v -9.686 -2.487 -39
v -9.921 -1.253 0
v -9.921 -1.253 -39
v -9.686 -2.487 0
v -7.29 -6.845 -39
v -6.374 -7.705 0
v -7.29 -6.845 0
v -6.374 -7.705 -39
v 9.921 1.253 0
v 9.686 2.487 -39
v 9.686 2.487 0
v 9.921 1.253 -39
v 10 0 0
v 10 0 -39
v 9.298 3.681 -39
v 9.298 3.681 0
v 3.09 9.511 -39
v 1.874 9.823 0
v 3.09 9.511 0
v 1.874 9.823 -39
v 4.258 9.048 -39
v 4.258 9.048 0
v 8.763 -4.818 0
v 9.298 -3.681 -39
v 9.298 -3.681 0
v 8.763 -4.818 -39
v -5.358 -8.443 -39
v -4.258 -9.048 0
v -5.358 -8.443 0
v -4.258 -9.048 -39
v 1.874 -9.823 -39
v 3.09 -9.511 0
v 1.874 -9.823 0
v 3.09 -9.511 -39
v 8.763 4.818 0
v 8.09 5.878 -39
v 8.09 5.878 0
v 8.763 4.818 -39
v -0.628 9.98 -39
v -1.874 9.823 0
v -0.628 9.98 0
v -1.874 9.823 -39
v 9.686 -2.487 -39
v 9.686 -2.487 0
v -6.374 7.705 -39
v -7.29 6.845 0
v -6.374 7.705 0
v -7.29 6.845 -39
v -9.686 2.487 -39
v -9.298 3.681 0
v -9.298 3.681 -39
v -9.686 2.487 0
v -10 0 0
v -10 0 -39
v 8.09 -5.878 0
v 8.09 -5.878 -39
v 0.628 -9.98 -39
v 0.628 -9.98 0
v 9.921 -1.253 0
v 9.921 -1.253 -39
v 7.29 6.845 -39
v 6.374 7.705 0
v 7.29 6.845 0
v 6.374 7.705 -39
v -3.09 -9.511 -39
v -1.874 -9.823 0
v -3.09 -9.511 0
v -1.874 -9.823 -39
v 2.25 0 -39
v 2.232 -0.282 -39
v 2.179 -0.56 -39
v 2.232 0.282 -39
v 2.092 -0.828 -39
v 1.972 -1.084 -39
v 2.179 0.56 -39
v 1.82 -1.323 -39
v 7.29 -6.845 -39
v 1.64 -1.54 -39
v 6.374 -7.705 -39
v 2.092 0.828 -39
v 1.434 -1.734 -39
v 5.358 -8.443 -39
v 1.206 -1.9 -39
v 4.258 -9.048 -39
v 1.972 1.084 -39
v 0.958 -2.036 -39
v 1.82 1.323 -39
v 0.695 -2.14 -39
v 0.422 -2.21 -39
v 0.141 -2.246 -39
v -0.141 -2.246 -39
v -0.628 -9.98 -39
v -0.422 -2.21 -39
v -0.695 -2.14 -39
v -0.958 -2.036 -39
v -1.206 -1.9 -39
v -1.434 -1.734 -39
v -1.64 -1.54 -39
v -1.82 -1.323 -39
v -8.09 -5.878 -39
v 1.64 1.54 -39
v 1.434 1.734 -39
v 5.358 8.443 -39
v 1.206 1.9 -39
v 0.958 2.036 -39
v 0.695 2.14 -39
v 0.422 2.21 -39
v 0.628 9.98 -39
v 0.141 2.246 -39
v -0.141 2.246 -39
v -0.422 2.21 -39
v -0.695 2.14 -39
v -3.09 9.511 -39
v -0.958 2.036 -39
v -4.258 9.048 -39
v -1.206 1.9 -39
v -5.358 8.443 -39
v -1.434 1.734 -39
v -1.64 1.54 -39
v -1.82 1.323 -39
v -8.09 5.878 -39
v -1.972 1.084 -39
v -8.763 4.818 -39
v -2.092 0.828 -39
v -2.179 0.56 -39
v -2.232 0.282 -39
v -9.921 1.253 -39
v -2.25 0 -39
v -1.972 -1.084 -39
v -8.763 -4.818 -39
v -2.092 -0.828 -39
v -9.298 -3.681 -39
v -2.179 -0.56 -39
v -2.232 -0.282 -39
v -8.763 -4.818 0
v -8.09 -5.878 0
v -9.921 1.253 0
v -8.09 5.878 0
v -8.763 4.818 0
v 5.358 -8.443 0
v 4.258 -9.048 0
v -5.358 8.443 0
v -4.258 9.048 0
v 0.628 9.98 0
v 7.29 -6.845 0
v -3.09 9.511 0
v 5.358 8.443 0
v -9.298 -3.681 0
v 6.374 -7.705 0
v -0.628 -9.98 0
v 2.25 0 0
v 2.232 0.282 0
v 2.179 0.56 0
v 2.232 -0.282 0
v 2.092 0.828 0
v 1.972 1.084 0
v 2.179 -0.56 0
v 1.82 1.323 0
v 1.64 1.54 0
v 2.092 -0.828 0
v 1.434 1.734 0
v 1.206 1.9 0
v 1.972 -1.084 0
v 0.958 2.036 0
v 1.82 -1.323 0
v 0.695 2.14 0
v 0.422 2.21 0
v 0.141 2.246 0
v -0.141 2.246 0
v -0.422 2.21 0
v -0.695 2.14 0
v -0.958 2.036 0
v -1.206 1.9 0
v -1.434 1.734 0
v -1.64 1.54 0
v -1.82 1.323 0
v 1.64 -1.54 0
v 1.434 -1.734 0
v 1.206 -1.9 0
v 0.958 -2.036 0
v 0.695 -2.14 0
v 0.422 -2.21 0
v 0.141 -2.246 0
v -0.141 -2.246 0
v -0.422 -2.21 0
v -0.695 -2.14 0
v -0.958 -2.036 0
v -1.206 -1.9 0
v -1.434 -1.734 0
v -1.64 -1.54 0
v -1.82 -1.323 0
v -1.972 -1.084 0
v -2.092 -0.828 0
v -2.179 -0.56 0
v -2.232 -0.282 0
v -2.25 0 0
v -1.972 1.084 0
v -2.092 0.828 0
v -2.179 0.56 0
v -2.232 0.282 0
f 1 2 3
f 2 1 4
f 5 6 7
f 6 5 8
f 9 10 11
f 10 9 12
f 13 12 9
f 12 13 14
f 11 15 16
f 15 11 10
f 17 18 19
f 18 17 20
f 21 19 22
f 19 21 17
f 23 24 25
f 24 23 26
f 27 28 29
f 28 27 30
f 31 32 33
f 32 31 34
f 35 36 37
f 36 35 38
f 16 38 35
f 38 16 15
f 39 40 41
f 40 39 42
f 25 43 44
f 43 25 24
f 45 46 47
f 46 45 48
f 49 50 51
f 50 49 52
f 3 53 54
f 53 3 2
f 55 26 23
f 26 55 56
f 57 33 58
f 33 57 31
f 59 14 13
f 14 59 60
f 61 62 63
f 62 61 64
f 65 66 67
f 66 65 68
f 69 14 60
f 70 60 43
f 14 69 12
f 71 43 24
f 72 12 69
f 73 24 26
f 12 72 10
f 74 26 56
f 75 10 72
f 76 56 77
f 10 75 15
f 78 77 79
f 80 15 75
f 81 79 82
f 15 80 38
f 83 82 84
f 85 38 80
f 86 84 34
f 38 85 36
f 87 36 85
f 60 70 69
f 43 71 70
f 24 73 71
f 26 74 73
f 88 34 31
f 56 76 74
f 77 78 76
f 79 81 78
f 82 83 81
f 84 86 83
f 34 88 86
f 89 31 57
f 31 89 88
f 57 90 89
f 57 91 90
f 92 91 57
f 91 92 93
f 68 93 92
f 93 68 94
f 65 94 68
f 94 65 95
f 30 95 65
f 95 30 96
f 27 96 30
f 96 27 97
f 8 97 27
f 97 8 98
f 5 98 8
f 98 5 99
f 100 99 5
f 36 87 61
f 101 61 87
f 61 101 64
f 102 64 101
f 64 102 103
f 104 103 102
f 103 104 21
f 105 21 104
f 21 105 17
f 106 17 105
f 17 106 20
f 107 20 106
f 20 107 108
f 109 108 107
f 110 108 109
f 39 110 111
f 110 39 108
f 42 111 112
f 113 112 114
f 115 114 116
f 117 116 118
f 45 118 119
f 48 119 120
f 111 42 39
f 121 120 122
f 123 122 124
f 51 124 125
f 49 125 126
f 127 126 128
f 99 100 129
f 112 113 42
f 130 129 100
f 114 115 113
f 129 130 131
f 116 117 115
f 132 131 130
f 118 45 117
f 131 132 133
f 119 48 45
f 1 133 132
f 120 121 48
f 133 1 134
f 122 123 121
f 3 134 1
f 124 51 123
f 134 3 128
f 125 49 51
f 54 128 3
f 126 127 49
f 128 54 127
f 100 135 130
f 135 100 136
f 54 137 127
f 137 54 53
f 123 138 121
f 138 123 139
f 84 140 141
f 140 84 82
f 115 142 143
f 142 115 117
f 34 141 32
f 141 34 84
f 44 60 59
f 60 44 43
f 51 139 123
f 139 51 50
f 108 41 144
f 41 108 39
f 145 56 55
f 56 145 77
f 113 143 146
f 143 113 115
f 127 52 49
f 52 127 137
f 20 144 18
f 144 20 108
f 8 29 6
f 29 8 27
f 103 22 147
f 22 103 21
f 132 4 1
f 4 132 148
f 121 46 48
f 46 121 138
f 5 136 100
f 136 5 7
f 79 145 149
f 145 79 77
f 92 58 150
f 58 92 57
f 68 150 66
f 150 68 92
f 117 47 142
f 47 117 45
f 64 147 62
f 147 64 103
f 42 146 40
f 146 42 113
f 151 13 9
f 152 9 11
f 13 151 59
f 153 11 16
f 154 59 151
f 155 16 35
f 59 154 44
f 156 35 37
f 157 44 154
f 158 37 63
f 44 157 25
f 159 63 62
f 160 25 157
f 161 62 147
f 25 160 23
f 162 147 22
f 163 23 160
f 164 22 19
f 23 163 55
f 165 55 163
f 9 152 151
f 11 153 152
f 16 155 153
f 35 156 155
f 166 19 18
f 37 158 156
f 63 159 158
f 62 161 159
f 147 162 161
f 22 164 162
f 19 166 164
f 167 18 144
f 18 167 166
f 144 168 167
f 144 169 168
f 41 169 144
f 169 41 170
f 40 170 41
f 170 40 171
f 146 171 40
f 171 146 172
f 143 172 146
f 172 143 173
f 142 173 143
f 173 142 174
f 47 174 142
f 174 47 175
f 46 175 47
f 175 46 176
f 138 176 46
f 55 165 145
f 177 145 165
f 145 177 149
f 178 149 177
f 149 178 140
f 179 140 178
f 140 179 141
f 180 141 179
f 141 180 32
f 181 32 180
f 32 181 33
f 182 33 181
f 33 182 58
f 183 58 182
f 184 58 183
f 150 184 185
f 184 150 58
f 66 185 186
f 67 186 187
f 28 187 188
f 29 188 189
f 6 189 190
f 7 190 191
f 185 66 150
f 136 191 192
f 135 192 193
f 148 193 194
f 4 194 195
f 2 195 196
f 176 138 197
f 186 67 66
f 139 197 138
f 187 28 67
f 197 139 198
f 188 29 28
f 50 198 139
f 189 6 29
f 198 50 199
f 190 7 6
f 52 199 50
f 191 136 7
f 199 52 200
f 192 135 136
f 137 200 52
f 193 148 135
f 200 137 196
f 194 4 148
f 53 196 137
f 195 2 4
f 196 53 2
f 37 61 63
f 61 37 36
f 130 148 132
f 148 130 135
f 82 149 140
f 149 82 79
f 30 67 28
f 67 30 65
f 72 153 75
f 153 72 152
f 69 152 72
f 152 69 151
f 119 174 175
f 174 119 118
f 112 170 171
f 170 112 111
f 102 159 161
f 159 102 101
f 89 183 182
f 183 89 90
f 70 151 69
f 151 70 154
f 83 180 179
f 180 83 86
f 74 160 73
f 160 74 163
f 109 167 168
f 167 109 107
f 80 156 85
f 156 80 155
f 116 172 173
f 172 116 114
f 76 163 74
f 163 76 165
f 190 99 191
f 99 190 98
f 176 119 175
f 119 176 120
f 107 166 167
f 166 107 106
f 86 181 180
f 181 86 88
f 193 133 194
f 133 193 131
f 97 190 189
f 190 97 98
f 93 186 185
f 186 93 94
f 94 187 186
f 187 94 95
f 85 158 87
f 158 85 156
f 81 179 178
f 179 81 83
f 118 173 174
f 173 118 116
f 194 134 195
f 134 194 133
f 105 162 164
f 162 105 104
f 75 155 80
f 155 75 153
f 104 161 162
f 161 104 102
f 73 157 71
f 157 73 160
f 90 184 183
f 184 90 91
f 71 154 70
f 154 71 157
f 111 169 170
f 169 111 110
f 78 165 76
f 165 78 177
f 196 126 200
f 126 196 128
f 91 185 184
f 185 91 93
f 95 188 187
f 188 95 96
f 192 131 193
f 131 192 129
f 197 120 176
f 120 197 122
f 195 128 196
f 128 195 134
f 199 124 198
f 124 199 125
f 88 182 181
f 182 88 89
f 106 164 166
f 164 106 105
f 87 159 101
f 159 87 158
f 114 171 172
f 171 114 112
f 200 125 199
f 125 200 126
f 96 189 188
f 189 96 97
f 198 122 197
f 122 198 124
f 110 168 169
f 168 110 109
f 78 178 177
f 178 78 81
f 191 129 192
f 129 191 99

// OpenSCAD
$fn = 50;


difference() {
	union() {
		translate(v = [0, 0, -39.0000000000]) {
			cylinder(h = 39, r = 10.0000000000);
		}
		cylinder(h = 0, r = 16.0000000000);
	}
	union() {
		#translate(v = [0, 0, -39]) {
			cylinder(h = 39, r = 2.2500000000);
		}
	}
}
